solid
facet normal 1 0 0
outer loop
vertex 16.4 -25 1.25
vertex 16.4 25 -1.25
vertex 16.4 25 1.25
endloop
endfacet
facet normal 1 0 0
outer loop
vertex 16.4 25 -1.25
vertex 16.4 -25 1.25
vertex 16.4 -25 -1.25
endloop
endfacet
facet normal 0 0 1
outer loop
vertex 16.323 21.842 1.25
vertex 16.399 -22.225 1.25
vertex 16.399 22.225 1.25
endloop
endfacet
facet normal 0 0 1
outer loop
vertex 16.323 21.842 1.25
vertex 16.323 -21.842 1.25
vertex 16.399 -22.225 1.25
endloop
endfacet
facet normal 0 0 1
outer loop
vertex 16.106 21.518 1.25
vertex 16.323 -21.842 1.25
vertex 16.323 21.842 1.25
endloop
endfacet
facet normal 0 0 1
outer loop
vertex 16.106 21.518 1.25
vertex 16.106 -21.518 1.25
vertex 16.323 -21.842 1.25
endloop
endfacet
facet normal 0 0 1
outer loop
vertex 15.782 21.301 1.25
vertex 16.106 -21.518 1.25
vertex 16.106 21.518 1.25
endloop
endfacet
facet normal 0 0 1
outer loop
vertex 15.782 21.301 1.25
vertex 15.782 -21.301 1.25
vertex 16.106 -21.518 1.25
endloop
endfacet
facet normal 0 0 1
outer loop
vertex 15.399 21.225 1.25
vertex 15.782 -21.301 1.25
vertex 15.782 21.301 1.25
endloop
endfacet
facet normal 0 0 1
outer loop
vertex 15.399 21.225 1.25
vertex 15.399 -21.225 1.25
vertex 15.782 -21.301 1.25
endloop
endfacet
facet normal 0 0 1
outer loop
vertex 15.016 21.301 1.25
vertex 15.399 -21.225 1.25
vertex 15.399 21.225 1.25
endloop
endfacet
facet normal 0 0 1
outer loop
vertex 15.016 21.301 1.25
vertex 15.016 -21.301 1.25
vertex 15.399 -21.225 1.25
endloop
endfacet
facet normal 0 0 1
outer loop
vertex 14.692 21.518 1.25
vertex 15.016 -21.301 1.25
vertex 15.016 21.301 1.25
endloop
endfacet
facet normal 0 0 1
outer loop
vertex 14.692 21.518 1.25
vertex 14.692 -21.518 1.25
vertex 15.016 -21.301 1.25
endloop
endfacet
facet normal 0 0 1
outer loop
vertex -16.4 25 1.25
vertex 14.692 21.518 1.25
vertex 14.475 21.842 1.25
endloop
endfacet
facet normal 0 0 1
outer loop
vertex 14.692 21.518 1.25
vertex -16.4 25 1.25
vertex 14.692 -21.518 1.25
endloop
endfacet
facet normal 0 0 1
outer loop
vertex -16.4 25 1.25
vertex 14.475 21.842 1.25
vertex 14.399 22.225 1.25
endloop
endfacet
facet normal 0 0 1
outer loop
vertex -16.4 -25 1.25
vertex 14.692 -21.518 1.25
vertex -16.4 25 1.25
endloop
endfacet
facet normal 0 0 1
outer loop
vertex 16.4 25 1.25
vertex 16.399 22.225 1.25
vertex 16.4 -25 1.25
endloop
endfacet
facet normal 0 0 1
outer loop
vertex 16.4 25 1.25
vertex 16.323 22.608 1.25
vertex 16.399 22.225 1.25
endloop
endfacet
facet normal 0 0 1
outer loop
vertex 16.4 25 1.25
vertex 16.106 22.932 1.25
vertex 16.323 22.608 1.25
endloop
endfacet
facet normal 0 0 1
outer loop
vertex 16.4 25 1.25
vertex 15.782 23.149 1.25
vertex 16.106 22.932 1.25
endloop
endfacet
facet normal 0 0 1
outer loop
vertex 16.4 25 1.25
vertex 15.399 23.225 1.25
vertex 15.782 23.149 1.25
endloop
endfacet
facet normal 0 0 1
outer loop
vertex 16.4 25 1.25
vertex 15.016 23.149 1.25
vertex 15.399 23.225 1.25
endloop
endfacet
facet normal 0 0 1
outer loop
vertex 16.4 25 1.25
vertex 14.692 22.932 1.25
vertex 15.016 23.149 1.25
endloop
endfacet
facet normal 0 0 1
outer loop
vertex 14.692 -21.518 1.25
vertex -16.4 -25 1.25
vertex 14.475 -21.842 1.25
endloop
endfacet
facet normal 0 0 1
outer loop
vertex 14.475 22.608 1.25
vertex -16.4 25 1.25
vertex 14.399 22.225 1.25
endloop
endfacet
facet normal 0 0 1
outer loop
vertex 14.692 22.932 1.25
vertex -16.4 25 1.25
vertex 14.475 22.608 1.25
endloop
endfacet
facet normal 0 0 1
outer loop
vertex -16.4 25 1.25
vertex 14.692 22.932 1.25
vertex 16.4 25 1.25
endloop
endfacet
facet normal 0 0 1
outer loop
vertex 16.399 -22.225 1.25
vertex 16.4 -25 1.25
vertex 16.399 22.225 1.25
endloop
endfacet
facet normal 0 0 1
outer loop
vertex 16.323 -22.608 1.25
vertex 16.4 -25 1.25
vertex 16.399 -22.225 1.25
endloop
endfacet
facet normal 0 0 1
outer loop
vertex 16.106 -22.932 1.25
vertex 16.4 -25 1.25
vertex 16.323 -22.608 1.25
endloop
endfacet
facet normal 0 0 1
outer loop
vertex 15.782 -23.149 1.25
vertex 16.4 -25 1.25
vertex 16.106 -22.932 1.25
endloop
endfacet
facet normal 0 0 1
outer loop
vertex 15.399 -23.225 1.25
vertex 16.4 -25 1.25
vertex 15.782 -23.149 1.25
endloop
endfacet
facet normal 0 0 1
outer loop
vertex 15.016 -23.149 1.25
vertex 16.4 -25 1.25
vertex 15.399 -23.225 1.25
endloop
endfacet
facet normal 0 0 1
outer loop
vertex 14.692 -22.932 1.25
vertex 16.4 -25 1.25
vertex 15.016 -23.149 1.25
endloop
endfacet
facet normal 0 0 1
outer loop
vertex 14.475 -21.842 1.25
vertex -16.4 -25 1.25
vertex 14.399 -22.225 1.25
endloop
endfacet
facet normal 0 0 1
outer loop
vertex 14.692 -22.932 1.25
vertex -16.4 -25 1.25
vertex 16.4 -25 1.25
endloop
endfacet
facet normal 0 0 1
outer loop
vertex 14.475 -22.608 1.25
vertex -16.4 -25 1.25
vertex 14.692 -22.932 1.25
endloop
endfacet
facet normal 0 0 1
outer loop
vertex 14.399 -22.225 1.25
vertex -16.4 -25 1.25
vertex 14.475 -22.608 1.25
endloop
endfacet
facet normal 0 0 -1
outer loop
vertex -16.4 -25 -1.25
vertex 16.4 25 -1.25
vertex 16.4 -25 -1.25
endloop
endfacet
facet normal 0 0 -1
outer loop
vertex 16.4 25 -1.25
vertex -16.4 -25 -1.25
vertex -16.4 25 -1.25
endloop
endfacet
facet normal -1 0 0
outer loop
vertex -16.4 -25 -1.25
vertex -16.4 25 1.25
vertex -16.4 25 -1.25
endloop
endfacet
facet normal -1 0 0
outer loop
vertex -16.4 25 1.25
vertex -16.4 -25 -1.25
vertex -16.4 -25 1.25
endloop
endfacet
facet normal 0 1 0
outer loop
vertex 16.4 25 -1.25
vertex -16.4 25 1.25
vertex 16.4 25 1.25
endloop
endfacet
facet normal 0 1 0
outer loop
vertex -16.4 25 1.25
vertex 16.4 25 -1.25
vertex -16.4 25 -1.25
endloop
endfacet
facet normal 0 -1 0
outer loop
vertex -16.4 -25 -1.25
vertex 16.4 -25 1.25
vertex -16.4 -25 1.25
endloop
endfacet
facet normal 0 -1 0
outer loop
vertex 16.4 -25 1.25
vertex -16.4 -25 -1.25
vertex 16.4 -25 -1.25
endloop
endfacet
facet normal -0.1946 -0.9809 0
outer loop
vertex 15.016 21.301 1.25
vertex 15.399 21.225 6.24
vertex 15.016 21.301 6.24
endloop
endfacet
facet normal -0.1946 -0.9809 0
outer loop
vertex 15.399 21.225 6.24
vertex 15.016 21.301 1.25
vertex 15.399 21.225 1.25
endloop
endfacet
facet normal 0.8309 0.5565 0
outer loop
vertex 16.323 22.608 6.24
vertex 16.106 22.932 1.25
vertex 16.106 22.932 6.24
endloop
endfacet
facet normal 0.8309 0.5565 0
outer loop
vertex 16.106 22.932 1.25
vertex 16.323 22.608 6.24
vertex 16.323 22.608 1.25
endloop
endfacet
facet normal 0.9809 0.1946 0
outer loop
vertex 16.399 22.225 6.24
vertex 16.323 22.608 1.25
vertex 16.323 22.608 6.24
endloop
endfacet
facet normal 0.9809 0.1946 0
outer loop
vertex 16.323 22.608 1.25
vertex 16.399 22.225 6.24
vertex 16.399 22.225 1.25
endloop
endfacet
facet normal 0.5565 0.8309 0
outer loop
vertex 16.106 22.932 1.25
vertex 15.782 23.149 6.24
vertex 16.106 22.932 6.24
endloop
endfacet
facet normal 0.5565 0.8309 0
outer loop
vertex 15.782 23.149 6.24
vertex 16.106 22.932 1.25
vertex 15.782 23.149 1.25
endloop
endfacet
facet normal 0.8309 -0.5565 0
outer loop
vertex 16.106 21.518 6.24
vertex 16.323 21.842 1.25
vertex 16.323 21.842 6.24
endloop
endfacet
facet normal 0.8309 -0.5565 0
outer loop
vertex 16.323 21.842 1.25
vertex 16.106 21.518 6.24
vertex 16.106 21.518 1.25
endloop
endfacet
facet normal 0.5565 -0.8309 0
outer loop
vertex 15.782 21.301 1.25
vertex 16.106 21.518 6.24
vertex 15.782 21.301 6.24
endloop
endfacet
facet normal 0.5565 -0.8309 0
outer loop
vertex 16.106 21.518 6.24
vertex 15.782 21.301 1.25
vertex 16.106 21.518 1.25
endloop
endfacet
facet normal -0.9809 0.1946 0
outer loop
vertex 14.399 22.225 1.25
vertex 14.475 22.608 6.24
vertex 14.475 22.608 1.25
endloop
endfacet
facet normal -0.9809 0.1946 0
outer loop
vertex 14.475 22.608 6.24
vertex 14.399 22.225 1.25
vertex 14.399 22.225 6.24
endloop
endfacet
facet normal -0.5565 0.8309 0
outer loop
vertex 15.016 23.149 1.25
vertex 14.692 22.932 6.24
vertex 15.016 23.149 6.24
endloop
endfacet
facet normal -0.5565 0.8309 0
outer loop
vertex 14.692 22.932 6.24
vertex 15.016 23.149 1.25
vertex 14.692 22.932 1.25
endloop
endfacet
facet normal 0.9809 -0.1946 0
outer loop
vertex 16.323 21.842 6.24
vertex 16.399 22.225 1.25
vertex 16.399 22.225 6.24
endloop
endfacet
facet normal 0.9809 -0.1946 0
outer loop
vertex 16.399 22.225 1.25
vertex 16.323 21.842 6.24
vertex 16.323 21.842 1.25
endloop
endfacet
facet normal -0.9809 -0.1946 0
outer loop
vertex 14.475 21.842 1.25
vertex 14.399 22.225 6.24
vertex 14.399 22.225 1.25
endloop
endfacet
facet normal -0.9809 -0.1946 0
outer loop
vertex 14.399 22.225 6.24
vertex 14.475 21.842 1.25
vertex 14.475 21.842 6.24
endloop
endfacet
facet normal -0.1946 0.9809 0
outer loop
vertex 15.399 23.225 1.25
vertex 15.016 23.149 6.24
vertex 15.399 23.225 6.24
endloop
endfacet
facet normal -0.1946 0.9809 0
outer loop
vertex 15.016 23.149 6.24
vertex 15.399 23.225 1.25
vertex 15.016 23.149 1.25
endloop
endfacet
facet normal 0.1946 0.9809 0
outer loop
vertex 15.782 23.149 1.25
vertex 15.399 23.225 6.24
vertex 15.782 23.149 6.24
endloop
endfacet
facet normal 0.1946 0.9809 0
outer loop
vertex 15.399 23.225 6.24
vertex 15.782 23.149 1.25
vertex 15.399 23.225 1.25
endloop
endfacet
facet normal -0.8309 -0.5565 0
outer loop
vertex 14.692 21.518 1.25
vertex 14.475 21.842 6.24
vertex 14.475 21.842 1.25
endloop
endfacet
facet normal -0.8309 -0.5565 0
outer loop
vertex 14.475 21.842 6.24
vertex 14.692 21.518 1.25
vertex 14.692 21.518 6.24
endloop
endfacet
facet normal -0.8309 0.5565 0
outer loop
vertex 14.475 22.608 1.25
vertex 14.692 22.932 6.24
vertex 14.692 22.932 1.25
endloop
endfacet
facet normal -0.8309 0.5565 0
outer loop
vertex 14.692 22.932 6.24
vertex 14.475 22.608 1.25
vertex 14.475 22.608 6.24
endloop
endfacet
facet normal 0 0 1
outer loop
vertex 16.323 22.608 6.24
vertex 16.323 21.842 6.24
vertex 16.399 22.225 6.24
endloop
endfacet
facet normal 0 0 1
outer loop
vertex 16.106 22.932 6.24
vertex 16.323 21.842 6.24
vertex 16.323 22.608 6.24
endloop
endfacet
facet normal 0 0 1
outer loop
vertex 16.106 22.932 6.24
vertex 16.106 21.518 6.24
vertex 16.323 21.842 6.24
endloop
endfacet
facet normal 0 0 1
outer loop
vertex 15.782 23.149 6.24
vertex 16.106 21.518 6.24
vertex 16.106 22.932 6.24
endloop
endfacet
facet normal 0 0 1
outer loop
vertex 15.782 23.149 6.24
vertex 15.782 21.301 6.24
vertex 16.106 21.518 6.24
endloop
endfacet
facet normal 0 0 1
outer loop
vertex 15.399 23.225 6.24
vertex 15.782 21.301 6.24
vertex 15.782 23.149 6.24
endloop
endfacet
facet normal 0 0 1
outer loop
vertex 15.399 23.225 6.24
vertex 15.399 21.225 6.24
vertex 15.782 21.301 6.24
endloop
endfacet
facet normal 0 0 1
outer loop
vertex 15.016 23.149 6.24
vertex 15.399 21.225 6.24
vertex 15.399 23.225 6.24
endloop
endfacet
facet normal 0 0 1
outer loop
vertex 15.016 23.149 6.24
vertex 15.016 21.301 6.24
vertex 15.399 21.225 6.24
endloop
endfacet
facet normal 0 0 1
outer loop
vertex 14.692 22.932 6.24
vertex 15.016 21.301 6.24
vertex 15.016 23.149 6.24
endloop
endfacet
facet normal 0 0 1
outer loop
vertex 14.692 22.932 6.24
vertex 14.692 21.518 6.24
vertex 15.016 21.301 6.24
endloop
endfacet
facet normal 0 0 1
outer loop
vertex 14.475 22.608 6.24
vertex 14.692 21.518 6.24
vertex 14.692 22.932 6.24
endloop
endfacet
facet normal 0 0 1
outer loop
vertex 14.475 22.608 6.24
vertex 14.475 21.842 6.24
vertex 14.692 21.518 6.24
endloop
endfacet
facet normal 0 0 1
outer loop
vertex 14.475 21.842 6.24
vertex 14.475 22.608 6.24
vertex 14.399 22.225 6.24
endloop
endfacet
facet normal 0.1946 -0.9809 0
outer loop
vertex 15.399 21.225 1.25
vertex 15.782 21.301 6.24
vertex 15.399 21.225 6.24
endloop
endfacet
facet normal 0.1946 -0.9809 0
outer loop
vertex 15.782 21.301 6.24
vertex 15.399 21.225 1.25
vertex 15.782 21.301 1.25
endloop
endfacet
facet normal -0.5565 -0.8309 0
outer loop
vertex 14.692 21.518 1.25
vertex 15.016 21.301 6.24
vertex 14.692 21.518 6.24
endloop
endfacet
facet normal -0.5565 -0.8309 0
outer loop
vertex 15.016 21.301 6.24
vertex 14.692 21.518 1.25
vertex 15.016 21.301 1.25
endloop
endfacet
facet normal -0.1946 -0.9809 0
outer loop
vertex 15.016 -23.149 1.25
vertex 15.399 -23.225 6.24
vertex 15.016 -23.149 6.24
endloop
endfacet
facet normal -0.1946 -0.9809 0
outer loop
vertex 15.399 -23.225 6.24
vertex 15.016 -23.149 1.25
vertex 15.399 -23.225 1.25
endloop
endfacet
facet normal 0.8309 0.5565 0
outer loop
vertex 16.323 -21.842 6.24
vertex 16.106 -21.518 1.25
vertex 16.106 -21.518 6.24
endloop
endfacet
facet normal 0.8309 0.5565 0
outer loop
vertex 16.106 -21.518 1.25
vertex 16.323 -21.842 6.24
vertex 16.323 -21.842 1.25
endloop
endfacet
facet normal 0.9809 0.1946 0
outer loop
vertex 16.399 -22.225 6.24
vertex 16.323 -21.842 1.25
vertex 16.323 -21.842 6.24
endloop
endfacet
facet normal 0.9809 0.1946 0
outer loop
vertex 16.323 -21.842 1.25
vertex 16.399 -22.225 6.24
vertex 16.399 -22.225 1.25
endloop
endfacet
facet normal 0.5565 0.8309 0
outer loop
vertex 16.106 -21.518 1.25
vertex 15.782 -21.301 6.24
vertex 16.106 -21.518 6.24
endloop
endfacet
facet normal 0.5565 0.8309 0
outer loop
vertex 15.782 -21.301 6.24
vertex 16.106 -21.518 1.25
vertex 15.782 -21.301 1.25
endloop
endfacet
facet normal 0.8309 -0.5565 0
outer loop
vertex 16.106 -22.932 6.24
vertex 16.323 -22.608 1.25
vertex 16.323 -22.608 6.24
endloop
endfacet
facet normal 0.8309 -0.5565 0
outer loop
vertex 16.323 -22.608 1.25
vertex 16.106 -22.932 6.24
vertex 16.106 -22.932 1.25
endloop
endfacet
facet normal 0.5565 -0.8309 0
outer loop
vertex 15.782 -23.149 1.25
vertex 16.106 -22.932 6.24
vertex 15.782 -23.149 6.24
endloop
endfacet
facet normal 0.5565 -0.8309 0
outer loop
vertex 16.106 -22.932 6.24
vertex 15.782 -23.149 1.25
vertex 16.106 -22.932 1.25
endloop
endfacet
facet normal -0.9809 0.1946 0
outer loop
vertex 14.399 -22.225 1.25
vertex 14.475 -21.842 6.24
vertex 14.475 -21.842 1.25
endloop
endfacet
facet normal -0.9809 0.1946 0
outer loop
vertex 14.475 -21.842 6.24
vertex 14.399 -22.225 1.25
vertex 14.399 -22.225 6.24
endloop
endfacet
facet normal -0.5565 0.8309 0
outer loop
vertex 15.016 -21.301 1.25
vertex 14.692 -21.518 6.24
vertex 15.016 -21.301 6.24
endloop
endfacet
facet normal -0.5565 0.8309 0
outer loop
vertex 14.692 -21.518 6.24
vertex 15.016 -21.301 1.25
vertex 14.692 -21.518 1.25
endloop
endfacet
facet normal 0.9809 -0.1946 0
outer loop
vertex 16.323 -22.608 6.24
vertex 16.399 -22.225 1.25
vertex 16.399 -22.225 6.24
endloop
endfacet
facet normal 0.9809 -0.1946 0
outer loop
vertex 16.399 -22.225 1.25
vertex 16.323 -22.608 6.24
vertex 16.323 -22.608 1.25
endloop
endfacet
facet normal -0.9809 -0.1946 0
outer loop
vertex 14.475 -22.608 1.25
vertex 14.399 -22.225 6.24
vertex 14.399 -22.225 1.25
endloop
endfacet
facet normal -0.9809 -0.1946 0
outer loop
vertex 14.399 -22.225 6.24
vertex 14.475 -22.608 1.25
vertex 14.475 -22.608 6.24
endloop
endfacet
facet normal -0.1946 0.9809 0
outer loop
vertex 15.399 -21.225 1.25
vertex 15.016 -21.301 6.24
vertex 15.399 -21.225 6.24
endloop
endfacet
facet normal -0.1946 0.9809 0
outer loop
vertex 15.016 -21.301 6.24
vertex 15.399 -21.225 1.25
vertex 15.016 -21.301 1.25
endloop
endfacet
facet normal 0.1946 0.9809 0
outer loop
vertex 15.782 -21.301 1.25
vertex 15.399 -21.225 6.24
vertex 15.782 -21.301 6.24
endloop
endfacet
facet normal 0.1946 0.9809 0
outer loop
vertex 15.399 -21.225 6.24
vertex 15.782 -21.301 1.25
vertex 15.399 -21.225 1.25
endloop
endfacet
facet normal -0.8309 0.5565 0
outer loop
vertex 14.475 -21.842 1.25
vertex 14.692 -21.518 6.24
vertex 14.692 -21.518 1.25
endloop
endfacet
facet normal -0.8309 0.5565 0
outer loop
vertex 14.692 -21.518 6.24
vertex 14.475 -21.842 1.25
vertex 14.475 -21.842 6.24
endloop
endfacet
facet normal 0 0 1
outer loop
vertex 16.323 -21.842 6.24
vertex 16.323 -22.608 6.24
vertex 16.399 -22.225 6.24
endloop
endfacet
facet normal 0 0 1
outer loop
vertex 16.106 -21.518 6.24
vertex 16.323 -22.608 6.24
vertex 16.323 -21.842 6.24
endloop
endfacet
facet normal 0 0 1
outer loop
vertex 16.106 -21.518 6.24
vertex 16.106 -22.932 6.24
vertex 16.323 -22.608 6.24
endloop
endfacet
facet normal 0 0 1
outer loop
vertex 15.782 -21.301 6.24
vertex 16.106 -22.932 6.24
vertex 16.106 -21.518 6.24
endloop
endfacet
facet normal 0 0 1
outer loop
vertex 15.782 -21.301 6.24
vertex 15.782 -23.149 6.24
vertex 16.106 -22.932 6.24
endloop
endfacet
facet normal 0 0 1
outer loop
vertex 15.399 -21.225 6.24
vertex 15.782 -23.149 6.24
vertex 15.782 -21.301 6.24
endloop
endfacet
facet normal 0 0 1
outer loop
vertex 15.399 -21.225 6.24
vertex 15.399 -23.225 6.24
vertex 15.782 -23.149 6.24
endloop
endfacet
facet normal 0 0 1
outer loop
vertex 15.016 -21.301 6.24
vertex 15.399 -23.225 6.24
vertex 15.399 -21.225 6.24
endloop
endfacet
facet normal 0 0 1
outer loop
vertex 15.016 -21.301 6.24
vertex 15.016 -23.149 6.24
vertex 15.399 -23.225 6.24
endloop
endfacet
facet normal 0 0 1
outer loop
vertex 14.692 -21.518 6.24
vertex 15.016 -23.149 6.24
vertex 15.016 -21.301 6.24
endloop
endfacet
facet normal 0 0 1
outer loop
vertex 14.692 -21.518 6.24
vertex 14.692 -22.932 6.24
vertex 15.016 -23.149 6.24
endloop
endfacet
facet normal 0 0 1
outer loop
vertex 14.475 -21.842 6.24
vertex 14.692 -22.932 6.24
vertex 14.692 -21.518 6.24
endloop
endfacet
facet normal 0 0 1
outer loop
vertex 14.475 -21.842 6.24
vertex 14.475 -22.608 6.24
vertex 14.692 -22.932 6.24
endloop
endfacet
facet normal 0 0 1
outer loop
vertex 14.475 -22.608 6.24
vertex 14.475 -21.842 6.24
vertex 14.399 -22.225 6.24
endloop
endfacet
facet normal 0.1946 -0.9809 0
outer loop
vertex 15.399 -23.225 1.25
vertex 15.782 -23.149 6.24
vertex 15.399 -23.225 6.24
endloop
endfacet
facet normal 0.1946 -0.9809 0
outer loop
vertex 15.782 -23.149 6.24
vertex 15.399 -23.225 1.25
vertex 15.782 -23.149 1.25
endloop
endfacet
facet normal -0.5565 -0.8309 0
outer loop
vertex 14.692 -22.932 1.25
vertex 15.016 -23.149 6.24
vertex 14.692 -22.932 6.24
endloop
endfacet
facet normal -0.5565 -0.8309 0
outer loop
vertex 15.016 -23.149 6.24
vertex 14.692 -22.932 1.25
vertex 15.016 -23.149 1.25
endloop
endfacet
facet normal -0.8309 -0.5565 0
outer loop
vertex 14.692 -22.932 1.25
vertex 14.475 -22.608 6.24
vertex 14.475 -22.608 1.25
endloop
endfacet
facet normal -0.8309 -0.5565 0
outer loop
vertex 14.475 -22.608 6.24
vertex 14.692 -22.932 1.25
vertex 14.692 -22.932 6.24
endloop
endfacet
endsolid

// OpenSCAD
$fa = 1;
$fs = 0.4;
//translate([0, 22, 0])
// bottom of case
x = 32.8;
y = 50;
cube([x,y,2.5],center=true);


translate([(x/2)-1.001,22.225,5-1.26])
    cylinder(h=5,r=1, center=true);
//translate([0,23,5.7-.2]) no need for retention cubes?
//    cube([1, 1, 1], center=true);
translate([((x/2)-1.001),-22.225,5-1.26])
    cylinder(h=5,r=1, center=true);
//translate([0,-23,5.7-.2]) no need for retention cubes?
//    cube([1, 1, 1], center=true);
    
